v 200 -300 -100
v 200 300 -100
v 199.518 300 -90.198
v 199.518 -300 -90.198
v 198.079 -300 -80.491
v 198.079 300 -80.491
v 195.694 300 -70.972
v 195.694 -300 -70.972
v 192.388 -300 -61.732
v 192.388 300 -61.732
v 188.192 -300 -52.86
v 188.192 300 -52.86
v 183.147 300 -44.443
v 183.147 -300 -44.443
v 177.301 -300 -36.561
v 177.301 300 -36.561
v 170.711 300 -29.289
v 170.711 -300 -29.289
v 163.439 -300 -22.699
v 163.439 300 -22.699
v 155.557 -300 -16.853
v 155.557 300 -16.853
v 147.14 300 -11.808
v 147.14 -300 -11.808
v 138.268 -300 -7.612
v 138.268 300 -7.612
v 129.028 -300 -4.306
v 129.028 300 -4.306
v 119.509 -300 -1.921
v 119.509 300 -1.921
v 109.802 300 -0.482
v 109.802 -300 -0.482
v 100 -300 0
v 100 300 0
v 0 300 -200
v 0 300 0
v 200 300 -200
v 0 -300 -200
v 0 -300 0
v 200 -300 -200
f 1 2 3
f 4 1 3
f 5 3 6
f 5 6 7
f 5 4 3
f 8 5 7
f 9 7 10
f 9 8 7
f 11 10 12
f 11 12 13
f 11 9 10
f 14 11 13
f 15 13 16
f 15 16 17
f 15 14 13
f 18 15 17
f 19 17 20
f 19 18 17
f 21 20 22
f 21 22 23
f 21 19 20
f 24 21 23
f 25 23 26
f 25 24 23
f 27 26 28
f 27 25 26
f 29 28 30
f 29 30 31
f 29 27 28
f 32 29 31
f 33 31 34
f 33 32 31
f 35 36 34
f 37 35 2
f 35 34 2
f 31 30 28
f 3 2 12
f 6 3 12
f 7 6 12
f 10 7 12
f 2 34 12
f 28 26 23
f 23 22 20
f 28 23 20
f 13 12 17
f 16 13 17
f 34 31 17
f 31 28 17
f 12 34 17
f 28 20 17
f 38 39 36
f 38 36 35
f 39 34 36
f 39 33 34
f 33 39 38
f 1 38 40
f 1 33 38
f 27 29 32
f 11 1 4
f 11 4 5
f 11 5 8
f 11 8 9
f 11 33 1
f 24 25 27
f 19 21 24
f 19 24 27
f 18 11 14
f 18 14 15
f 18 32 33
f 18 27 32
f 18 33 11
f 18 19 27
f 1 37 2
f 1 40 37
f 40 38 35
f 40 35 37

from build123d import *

# Parameters (mm, degrees)
F1_DEPTH = 300


with BuildPart() as f1:
    # F0 (on Front) → F1 (new body, symmetric)
    with BuildSketch(Plane.XZ):
        with BuildLine():
            Line((100, 0), (0, 0))
            Line((0, 0), (0, -200))
            Line((0, -200), (200, -200))
            Line((200, -200), (200, -100))
            ThreePointArc((200, -100), (170.710678, -29.289322), (100, 0))
        make_face()
    extrude(amount=F1_DEPTH, both=True)


solid = f1.part
